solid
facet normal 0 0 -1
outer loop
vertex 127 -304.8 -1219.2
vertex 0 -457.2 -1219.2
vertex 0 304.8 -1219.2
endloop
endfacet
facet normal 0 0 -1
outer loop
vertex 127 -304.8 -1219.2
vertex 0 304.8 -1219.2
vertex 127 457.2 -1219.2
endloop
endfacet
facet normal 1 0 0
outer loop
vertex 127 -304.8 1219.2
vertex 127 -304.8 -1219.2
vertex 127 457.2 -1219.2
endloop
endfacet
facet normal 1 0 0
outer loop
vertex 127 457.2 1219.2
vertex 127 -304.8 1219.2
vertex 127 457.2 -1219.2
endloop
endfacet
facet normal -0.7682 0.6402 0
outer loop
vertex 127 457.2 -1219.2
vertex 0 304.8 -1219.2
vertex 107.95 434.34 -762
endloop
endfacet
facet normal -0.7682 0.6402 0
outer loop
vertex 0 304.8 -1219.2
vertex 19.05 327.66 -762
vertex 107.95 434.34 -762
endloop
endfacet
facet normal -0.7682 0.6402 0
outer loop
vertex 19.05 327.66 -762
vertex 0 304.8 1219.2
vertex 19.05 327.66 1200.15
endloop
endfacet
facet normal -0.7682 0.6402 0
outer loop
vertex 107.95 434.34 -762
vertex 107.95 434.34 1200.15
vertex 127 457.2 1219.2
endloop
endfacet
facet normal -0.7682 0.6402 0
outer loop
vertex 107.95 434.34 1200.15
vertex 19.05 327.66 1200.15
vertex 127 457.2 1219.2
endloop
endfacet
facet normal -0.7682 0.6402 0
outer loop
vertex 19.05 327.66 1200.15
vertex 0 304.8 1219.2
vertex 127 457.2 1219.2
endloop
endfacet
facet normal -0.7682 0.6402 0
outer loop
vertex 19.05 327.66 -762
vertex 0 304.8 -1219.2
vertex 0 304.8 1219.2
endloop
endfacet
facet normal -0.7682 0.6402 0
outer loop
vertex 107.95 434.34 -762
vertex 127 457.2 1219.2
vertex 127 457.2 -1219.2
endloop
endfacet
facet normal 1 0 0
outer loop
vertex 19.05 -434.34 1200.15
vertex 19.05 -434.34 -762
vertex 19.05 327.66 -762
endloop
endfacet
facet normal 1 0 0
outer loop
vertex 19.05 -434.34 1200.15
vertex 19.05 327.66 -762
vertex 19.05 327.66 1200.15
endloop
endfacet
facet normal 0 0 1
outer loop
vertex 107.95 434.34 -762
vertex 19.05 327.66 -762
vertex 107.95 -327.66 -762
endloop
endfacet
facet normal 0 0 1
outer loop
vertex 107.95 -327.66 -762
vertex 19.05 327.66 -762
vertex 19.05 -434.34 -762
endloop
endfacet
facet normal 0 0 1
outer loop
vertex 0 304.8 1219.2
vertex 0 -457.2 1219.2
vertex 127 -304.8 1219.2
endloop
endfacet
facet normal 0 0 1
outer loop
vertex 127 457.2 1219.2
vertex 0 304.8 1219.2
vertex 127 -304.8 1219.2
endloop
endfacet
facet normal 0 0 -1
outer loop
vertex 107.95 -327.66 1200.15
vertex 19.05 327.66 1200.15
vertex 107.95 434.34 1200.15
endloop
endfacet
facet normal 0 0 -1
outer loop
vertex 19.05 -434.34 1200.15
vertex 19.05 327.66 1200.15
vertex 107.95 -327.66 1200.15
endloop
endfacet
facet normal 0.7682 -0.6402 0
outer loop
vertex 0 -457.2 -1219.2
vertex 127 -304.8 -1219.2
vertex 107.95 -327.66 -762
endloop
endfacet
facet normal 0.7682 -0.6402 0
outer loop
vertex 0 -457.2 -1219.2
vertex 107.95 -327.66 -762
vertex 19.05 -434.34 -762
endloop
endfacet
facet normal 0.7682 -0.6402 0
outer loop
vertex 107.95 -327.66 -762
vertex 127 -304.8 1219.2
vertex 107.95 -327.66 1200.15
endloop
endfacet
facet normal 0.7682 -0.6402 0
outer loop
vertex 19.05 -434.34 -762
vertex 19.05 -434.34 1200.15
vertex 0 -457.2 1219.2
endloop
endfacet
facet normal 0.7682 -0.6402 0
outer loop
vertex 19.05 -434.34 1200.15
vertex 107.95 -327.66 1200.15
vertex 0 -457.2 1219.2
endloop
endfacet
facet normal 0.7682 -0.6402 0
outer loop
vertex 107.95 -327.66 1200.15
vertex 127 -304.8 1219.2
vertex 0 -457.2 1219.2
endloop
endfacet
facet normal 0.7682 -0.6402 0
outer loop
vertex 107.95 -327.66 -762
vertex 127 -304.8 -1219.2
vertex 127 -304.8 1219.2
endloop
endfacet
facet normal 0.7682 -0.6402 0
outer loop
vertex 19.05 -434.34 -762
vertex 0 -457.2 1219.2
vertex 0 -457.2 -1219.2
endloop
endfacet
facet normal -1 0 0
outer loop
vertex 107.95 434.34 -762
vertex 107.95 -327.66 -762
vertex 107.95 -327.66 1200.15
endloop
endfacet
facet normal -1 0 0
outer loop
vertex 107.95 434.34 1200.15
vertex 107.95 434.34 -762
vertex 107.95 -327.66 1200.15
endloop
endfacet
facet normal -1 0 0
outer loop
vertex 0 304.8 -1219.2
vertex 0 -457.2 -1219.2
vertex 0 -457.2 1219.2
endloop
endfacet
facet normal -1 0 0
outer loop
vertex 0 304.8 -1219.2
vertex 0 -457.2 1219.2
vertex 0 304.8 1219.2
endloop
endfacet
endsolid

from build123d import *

# Parameters (mm, degrees)
F0_W     = 914.4
F0_H     = 2438.4
F1_DEPTH = 127
F2_W     = 88.9
F2_H     = 1962.15
F3_DEPTH = 914.4
F5_DEPTH = 2438.401


with BuildPart() as f1:
    # F0 (on Right) → F1 (new body)
    with BuildSketch(Plane.YZ):
        Rectangle(F0_W, F0_H)
    extrude(amount=F1_DEPTH)

    # F2 (on face) → F3 (cut, through all)
    with BuildSketch(Plane.XZ.offset(457.2)):
        with Locations((63.5, 219.075)):
            Rectangle(F2_W, F2_H)
    extrude(amount=-F3_DEPTH, mode=Mode.SUBTRACT)

    # F4 (on face) → F5 (cut, through all)
    with BuildSketch(Plane.XY.offset(1219.2)):
        Polygon((0, 304.8), (127, 457.2), (0, 457.2), align=None)
        Polygon((127, -457.2), (127, -304.8), (0, -457.2), align=None)
    extrude(amount=-F5_DEPTH, mode=Mode.SUBTRACT)


solid = f1.part
